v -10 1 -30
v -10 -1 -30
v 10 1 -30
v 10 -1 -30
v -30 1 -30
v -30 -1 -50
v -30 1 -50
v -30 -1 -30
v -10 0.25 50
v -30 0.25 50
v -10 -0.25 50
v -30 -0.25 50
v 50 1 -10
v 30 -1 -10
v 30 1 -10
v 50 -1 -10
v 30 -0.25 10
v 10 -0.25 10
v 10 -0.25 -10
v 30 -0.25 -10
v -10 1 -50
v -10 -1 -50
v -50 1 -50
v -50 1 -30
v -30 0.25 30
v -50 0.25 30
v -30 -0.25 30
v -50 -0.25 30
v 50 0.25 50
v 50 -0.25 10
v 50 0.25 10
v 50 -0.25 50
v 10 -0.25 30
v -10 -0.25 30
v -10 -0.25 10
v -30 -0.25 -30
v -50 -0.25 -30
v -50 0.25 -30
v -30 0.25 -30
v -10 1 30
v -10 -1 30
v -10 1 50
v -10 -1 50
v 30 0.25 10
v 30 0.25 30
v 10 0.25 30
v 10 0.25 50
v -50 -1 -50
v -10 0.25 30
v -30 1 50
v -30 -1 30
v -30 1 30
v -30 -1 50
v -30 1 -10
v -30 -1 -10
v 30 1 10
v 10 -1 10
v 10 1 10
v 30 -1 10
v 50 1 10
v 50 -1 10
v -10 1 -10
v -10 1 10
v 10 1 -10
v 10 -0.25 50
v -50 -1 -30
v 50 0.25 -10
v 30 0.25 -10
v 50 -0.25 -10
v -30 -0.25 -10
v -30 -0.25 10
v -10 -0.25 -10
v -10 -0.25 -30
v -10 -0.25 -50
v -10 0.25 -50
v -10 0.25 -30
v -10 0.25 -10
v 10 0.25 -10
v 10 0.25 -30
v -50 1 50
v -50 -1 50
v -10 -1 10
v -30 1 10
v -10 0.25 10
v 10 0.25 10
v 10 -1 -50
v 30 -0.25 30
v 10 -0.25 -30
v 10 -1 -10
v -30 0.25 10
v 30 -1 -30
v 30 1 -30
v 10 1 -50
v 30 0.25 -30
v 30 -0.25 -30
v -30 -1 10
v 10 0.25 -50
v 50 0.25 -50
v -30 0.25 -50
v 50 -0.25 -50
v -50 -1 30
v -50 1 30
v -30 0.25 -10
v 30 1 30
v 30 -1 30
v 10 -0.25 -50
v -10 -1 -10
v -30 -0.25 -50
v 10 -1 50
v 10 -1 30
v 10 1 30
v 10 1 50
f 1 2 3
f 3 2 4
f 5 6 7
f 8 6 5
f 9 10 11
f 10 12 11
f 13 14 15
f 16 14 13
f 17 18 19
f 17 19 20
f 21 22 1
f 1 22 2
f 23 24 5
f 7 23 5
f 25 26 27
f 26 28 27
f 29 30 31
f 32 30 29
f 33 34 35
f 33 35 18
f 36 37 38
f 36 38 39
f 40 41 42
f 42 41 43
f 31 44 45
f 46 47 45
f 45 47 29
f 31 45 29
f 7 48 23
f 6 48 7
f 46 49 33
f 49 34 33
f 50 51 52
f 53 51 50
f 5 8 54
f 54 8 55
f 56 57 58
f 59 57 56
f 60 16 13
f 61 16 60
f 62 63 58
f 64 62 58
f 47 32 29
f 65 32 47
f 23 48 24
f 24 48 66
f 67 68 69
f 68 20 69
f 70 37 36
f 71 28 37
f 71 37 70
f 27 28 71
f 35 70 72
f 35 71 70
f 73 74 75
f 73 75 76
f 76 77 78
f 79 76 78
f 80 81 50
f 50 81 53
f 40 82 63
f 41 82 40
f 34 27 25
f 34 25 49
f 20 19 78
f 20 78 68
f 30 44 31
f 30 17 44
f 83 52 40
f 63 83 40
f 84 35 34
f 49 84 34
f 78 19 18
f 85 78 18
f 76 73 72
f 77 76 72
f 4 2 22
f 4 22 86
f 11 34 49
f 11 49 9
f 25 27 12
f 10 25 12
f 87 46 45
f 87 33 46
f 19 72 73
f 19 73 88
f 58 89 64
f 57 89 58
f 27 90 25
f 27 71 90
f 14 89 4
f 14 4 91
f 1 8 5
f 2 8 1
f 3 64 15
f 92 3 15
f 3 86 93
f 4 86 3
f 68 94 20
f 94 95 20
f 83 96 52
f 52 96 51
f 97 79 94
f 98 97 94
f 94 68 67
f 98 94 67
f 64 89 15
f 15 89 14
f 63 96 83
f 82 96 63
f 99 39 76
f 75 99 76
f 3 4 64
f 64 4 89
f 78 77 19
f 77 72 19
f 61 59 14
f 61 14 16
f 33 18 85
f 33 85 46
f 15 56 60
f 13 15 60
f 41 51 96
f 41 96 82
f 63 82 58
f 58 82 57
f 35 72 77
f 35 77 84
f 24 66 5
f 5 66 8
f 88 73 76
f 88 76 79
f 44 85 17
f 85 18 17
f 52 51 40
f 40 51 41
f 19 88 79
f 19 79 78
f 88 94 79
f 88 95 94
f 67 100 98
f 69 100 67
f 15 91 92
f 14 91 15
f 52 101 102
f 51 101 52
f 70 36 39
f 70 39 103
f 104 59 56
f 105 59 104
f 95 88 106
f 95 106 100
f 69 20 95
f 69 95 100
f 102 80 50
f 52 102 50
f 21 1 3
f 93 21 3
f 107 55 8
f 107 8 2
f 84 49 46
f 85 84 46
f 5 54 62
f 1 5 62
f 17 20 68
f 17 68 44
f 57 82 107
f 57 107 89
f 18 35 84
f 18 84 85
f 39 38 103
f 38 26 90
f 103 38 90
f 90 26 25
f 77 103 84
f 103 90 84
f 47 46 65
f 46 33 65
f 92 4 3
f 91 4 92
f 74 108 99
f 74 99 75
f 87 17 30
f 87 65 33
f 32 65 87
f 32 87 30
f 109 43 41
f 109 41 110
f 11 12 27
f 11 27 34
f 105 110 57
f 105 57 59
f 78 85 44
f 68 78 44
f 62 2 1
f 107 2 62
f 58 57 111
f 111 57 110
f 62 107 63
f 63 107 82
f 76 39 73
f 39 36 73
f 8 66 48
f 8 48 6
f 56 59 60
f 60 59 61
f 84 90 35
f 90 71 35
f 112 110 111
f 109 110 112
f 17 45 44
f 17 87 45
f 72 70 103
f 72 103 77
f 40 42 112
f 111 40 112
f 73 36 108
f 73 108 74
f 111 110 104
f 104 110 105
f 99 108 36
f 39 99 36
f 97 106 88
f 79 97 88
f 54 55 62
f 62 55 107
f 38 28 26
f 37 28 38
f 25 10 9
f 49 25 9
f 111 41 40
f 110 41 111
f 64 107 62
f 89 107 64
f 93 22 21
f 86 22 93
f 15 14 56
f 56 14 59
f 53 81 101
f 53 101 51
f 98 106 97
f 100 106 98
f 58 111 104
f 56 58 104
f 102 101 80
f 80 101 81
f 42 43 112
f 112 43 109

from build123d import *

# Parameters (mm, degrees)
F0_W     = 20
F0_H     = 20
F1_DEPTH = 1
F2_DEPTH = 0.25


with BuildPart() as f1:
    # F0 (on Front) → F1 (new body, symmetric)
    with BuildSketch(Plane.XZ):
        with Locations((-40, 40)):
            Rectangle(F0_W, F0_H)
    extrude(amount=F1_DEPTH, both=True)


with BuildPart() as f1b:
    # F0 (on Front) → F1, piece 2 (new body, symmetric)
    with BuildSketch(Plane.XZ):
        with Locations((-20, 20)):
            Rectangle(F0_W, F0_H)
    extrude(amount=F1_DEPTH, both=True)


with BuildPart() as f1c:
    # F0 (on Front) → F1, piece 3 (new body, symmetric)
    with BuildSketch(Plane.XZ):
        Rectangle(F0_W, F0_H)
    extrude(amount=F1_DEPTH, both=True)


with BuildPart() as f1d:
    # F0 (on Front) → F1, piece 4 (new body, symmetric)
    with BuildSketch(Plane.XZ):
        with Locations((-20, -20)):
            Rectangle(F0_W, F0_H)
    extrude(amount=F1_DEPTH, both=True)


with BuildPart() as f1e:
    # F0 (on Front) → F1, piece 5 (new body, symmetric)
    with BuildSketch(Plane.XZ):
        with Locations((-40, -40)):
            Rectangle(F0_W, F0_H)
    extrude(amount=F1_DEPTH, both=True)


with BuildPart() as f1f:
    # F0 (on Front) → F1, piece 6 (new body, symmetric)
    with BuildSketch(Plane.XZ):
        with Locations((0, 40)):
            Rectangle(F0_W, F0_H)
    extrude(amount=F1_DEPTH, both=True)


with BuildPart() as f1g:
    # F0 (on Front) → F1, piece 7 (new body, symmetric)
    with BuildSketch(Plane.XZ):
        with Locations((20, 20)):
            Rectangle(F0_W, F0_H)
    extrude(amount=F1_DEPTH, both=True)


with BuildPart() as f1h:
    # F0 (on Front) → F1, piece 8 (new body, symmetric)
    with BuildSketch(Plane.XZ):
        with Locations((40, 0)):
            Rectangle(F0_W, F0_H)
    extrude(amount=F1_DEPTH, both=True)


with BuildPart() as f1i:
    # F0 (on Front) → F1, piece 9 (new body, symmetric)
    with BuildSketch(Plane.XZ):
        with Locations((20, -20)):
            Rectangle(F0_W, F0_H)
    extrude(amount=F1_DEPTH, both=True)


with BuildPart() as f1j:
    # F0 (on Front) → F1, piece 10 (new body, symmetric)
    with BuildSketch(Plane.XZ):
        with Locations((0, -40)):
            Rectangle(F0_W, F0_H)
    extrude(amount=F1_DEPTH, both=True)


with BuildPart() as f2:
    # F0 (on Front) → F2 (new body, symmetric)
    with BuildSketch(Plane.XZ):
        with Locations((-40, 20)):
            Rectangle(F0_W, F0_H)
        with Locations((-40, 0)):
            Rectangle(F0_W, F0_H)
        with Locations((-40, -20)):
            Rectangle(F0_W, F0_H)
        with Locations((-20, 0)):
            Rectangle(F0_W, F0_H)
    extrude(amount=F2_DEPTH, both=True)


with BuildPart() as f2b:
    # F0 (on Front) → F2, piece 2 (new body, symmetric)
    with BuildSketch(Plane.XZ):
        with Locations((-20, 40)):
            Rectangle(F0_W, F0_H)
    extrude(amount=F2_DEPTH, both=True)


with BuildPart() as f2c:
    # F0 (on Front) → F2, piece 3 (new body, symmetric)
    with BuildSketch(Plane.XZ):
        with Locations((0, 20)):
            Rectangle(F0_W, F0_H)
    extrude(amount=F2_DEPTH, both=True)


with BuildPart() as f2d:
    # F0 (on Front) → F2, piece 4 (new body, symmetric)
    with BuildSketch(Plane.XZ):
        with Locations((20, 0)):
            Rectangle(F0_W, F0_H)
    extrude(amount=F2_DEPTH, both=True)


with BuildPart() as f2e:
    # F0 (on Front) → F2, piece 5 (new body, symmetric)
    with BuildSketch(Plane.XZ):
        with Locations((0, -20)):
            Rectangle(F0_W, F0_H)
    extrude(amount=F2_DEPTH, both=True)


with BuildPart() as f2f:
    # F0 (on Front) → F2, piece 6 (new body, symmetric)
    with BuildSketch(Plane.XZ):
        with Locations((-20, -40)):
            Rectangle(F0_W, F0_H)
    extrude(amount=F2_DEPTH, both=True)


with BuildPart() as f2g:
    # F0 (on Front) → F2, piece 7 (new body, symmetric)
    with BuildSketch(Plane.XZ):
        with Locations((20, -40)):
            Rectangle(F0_W, F0_H)
        with Locations((40, -40)):
            Rectangle(F0_W, F0_H)
        with Locations((40, -20)):
            Rectangle(F0_W, F0_H)
    extrude(amount=F2_DEPTH, both=True)


with BuildPart() as f2h:
    # F0 (on Front) → F2, piece 8 (new body, symmetric)
    with BuildSketch(Plane.XZ):
        with Locations((40, 20)):
            Rectangle(F0_W, F0_H)
        with Locations((40, 40)):
            Rectangle(F0_W, F0_H)
        with Locations((20, 40)):
            Rectangle(F0_W, F0_H)
    extrude(amount=F2_DEPTH, both=True)


solid = Compound([f1.part, f1b.part, f1c.part, f1d.part, f1e.part, f1f.part, f1g.part, f1h.part, f1i.part, f1j.part, f2.part, f2b.part, f2c.part, f2d.part, f2e.part, f2f.part, f2g.part, f2h.part])
